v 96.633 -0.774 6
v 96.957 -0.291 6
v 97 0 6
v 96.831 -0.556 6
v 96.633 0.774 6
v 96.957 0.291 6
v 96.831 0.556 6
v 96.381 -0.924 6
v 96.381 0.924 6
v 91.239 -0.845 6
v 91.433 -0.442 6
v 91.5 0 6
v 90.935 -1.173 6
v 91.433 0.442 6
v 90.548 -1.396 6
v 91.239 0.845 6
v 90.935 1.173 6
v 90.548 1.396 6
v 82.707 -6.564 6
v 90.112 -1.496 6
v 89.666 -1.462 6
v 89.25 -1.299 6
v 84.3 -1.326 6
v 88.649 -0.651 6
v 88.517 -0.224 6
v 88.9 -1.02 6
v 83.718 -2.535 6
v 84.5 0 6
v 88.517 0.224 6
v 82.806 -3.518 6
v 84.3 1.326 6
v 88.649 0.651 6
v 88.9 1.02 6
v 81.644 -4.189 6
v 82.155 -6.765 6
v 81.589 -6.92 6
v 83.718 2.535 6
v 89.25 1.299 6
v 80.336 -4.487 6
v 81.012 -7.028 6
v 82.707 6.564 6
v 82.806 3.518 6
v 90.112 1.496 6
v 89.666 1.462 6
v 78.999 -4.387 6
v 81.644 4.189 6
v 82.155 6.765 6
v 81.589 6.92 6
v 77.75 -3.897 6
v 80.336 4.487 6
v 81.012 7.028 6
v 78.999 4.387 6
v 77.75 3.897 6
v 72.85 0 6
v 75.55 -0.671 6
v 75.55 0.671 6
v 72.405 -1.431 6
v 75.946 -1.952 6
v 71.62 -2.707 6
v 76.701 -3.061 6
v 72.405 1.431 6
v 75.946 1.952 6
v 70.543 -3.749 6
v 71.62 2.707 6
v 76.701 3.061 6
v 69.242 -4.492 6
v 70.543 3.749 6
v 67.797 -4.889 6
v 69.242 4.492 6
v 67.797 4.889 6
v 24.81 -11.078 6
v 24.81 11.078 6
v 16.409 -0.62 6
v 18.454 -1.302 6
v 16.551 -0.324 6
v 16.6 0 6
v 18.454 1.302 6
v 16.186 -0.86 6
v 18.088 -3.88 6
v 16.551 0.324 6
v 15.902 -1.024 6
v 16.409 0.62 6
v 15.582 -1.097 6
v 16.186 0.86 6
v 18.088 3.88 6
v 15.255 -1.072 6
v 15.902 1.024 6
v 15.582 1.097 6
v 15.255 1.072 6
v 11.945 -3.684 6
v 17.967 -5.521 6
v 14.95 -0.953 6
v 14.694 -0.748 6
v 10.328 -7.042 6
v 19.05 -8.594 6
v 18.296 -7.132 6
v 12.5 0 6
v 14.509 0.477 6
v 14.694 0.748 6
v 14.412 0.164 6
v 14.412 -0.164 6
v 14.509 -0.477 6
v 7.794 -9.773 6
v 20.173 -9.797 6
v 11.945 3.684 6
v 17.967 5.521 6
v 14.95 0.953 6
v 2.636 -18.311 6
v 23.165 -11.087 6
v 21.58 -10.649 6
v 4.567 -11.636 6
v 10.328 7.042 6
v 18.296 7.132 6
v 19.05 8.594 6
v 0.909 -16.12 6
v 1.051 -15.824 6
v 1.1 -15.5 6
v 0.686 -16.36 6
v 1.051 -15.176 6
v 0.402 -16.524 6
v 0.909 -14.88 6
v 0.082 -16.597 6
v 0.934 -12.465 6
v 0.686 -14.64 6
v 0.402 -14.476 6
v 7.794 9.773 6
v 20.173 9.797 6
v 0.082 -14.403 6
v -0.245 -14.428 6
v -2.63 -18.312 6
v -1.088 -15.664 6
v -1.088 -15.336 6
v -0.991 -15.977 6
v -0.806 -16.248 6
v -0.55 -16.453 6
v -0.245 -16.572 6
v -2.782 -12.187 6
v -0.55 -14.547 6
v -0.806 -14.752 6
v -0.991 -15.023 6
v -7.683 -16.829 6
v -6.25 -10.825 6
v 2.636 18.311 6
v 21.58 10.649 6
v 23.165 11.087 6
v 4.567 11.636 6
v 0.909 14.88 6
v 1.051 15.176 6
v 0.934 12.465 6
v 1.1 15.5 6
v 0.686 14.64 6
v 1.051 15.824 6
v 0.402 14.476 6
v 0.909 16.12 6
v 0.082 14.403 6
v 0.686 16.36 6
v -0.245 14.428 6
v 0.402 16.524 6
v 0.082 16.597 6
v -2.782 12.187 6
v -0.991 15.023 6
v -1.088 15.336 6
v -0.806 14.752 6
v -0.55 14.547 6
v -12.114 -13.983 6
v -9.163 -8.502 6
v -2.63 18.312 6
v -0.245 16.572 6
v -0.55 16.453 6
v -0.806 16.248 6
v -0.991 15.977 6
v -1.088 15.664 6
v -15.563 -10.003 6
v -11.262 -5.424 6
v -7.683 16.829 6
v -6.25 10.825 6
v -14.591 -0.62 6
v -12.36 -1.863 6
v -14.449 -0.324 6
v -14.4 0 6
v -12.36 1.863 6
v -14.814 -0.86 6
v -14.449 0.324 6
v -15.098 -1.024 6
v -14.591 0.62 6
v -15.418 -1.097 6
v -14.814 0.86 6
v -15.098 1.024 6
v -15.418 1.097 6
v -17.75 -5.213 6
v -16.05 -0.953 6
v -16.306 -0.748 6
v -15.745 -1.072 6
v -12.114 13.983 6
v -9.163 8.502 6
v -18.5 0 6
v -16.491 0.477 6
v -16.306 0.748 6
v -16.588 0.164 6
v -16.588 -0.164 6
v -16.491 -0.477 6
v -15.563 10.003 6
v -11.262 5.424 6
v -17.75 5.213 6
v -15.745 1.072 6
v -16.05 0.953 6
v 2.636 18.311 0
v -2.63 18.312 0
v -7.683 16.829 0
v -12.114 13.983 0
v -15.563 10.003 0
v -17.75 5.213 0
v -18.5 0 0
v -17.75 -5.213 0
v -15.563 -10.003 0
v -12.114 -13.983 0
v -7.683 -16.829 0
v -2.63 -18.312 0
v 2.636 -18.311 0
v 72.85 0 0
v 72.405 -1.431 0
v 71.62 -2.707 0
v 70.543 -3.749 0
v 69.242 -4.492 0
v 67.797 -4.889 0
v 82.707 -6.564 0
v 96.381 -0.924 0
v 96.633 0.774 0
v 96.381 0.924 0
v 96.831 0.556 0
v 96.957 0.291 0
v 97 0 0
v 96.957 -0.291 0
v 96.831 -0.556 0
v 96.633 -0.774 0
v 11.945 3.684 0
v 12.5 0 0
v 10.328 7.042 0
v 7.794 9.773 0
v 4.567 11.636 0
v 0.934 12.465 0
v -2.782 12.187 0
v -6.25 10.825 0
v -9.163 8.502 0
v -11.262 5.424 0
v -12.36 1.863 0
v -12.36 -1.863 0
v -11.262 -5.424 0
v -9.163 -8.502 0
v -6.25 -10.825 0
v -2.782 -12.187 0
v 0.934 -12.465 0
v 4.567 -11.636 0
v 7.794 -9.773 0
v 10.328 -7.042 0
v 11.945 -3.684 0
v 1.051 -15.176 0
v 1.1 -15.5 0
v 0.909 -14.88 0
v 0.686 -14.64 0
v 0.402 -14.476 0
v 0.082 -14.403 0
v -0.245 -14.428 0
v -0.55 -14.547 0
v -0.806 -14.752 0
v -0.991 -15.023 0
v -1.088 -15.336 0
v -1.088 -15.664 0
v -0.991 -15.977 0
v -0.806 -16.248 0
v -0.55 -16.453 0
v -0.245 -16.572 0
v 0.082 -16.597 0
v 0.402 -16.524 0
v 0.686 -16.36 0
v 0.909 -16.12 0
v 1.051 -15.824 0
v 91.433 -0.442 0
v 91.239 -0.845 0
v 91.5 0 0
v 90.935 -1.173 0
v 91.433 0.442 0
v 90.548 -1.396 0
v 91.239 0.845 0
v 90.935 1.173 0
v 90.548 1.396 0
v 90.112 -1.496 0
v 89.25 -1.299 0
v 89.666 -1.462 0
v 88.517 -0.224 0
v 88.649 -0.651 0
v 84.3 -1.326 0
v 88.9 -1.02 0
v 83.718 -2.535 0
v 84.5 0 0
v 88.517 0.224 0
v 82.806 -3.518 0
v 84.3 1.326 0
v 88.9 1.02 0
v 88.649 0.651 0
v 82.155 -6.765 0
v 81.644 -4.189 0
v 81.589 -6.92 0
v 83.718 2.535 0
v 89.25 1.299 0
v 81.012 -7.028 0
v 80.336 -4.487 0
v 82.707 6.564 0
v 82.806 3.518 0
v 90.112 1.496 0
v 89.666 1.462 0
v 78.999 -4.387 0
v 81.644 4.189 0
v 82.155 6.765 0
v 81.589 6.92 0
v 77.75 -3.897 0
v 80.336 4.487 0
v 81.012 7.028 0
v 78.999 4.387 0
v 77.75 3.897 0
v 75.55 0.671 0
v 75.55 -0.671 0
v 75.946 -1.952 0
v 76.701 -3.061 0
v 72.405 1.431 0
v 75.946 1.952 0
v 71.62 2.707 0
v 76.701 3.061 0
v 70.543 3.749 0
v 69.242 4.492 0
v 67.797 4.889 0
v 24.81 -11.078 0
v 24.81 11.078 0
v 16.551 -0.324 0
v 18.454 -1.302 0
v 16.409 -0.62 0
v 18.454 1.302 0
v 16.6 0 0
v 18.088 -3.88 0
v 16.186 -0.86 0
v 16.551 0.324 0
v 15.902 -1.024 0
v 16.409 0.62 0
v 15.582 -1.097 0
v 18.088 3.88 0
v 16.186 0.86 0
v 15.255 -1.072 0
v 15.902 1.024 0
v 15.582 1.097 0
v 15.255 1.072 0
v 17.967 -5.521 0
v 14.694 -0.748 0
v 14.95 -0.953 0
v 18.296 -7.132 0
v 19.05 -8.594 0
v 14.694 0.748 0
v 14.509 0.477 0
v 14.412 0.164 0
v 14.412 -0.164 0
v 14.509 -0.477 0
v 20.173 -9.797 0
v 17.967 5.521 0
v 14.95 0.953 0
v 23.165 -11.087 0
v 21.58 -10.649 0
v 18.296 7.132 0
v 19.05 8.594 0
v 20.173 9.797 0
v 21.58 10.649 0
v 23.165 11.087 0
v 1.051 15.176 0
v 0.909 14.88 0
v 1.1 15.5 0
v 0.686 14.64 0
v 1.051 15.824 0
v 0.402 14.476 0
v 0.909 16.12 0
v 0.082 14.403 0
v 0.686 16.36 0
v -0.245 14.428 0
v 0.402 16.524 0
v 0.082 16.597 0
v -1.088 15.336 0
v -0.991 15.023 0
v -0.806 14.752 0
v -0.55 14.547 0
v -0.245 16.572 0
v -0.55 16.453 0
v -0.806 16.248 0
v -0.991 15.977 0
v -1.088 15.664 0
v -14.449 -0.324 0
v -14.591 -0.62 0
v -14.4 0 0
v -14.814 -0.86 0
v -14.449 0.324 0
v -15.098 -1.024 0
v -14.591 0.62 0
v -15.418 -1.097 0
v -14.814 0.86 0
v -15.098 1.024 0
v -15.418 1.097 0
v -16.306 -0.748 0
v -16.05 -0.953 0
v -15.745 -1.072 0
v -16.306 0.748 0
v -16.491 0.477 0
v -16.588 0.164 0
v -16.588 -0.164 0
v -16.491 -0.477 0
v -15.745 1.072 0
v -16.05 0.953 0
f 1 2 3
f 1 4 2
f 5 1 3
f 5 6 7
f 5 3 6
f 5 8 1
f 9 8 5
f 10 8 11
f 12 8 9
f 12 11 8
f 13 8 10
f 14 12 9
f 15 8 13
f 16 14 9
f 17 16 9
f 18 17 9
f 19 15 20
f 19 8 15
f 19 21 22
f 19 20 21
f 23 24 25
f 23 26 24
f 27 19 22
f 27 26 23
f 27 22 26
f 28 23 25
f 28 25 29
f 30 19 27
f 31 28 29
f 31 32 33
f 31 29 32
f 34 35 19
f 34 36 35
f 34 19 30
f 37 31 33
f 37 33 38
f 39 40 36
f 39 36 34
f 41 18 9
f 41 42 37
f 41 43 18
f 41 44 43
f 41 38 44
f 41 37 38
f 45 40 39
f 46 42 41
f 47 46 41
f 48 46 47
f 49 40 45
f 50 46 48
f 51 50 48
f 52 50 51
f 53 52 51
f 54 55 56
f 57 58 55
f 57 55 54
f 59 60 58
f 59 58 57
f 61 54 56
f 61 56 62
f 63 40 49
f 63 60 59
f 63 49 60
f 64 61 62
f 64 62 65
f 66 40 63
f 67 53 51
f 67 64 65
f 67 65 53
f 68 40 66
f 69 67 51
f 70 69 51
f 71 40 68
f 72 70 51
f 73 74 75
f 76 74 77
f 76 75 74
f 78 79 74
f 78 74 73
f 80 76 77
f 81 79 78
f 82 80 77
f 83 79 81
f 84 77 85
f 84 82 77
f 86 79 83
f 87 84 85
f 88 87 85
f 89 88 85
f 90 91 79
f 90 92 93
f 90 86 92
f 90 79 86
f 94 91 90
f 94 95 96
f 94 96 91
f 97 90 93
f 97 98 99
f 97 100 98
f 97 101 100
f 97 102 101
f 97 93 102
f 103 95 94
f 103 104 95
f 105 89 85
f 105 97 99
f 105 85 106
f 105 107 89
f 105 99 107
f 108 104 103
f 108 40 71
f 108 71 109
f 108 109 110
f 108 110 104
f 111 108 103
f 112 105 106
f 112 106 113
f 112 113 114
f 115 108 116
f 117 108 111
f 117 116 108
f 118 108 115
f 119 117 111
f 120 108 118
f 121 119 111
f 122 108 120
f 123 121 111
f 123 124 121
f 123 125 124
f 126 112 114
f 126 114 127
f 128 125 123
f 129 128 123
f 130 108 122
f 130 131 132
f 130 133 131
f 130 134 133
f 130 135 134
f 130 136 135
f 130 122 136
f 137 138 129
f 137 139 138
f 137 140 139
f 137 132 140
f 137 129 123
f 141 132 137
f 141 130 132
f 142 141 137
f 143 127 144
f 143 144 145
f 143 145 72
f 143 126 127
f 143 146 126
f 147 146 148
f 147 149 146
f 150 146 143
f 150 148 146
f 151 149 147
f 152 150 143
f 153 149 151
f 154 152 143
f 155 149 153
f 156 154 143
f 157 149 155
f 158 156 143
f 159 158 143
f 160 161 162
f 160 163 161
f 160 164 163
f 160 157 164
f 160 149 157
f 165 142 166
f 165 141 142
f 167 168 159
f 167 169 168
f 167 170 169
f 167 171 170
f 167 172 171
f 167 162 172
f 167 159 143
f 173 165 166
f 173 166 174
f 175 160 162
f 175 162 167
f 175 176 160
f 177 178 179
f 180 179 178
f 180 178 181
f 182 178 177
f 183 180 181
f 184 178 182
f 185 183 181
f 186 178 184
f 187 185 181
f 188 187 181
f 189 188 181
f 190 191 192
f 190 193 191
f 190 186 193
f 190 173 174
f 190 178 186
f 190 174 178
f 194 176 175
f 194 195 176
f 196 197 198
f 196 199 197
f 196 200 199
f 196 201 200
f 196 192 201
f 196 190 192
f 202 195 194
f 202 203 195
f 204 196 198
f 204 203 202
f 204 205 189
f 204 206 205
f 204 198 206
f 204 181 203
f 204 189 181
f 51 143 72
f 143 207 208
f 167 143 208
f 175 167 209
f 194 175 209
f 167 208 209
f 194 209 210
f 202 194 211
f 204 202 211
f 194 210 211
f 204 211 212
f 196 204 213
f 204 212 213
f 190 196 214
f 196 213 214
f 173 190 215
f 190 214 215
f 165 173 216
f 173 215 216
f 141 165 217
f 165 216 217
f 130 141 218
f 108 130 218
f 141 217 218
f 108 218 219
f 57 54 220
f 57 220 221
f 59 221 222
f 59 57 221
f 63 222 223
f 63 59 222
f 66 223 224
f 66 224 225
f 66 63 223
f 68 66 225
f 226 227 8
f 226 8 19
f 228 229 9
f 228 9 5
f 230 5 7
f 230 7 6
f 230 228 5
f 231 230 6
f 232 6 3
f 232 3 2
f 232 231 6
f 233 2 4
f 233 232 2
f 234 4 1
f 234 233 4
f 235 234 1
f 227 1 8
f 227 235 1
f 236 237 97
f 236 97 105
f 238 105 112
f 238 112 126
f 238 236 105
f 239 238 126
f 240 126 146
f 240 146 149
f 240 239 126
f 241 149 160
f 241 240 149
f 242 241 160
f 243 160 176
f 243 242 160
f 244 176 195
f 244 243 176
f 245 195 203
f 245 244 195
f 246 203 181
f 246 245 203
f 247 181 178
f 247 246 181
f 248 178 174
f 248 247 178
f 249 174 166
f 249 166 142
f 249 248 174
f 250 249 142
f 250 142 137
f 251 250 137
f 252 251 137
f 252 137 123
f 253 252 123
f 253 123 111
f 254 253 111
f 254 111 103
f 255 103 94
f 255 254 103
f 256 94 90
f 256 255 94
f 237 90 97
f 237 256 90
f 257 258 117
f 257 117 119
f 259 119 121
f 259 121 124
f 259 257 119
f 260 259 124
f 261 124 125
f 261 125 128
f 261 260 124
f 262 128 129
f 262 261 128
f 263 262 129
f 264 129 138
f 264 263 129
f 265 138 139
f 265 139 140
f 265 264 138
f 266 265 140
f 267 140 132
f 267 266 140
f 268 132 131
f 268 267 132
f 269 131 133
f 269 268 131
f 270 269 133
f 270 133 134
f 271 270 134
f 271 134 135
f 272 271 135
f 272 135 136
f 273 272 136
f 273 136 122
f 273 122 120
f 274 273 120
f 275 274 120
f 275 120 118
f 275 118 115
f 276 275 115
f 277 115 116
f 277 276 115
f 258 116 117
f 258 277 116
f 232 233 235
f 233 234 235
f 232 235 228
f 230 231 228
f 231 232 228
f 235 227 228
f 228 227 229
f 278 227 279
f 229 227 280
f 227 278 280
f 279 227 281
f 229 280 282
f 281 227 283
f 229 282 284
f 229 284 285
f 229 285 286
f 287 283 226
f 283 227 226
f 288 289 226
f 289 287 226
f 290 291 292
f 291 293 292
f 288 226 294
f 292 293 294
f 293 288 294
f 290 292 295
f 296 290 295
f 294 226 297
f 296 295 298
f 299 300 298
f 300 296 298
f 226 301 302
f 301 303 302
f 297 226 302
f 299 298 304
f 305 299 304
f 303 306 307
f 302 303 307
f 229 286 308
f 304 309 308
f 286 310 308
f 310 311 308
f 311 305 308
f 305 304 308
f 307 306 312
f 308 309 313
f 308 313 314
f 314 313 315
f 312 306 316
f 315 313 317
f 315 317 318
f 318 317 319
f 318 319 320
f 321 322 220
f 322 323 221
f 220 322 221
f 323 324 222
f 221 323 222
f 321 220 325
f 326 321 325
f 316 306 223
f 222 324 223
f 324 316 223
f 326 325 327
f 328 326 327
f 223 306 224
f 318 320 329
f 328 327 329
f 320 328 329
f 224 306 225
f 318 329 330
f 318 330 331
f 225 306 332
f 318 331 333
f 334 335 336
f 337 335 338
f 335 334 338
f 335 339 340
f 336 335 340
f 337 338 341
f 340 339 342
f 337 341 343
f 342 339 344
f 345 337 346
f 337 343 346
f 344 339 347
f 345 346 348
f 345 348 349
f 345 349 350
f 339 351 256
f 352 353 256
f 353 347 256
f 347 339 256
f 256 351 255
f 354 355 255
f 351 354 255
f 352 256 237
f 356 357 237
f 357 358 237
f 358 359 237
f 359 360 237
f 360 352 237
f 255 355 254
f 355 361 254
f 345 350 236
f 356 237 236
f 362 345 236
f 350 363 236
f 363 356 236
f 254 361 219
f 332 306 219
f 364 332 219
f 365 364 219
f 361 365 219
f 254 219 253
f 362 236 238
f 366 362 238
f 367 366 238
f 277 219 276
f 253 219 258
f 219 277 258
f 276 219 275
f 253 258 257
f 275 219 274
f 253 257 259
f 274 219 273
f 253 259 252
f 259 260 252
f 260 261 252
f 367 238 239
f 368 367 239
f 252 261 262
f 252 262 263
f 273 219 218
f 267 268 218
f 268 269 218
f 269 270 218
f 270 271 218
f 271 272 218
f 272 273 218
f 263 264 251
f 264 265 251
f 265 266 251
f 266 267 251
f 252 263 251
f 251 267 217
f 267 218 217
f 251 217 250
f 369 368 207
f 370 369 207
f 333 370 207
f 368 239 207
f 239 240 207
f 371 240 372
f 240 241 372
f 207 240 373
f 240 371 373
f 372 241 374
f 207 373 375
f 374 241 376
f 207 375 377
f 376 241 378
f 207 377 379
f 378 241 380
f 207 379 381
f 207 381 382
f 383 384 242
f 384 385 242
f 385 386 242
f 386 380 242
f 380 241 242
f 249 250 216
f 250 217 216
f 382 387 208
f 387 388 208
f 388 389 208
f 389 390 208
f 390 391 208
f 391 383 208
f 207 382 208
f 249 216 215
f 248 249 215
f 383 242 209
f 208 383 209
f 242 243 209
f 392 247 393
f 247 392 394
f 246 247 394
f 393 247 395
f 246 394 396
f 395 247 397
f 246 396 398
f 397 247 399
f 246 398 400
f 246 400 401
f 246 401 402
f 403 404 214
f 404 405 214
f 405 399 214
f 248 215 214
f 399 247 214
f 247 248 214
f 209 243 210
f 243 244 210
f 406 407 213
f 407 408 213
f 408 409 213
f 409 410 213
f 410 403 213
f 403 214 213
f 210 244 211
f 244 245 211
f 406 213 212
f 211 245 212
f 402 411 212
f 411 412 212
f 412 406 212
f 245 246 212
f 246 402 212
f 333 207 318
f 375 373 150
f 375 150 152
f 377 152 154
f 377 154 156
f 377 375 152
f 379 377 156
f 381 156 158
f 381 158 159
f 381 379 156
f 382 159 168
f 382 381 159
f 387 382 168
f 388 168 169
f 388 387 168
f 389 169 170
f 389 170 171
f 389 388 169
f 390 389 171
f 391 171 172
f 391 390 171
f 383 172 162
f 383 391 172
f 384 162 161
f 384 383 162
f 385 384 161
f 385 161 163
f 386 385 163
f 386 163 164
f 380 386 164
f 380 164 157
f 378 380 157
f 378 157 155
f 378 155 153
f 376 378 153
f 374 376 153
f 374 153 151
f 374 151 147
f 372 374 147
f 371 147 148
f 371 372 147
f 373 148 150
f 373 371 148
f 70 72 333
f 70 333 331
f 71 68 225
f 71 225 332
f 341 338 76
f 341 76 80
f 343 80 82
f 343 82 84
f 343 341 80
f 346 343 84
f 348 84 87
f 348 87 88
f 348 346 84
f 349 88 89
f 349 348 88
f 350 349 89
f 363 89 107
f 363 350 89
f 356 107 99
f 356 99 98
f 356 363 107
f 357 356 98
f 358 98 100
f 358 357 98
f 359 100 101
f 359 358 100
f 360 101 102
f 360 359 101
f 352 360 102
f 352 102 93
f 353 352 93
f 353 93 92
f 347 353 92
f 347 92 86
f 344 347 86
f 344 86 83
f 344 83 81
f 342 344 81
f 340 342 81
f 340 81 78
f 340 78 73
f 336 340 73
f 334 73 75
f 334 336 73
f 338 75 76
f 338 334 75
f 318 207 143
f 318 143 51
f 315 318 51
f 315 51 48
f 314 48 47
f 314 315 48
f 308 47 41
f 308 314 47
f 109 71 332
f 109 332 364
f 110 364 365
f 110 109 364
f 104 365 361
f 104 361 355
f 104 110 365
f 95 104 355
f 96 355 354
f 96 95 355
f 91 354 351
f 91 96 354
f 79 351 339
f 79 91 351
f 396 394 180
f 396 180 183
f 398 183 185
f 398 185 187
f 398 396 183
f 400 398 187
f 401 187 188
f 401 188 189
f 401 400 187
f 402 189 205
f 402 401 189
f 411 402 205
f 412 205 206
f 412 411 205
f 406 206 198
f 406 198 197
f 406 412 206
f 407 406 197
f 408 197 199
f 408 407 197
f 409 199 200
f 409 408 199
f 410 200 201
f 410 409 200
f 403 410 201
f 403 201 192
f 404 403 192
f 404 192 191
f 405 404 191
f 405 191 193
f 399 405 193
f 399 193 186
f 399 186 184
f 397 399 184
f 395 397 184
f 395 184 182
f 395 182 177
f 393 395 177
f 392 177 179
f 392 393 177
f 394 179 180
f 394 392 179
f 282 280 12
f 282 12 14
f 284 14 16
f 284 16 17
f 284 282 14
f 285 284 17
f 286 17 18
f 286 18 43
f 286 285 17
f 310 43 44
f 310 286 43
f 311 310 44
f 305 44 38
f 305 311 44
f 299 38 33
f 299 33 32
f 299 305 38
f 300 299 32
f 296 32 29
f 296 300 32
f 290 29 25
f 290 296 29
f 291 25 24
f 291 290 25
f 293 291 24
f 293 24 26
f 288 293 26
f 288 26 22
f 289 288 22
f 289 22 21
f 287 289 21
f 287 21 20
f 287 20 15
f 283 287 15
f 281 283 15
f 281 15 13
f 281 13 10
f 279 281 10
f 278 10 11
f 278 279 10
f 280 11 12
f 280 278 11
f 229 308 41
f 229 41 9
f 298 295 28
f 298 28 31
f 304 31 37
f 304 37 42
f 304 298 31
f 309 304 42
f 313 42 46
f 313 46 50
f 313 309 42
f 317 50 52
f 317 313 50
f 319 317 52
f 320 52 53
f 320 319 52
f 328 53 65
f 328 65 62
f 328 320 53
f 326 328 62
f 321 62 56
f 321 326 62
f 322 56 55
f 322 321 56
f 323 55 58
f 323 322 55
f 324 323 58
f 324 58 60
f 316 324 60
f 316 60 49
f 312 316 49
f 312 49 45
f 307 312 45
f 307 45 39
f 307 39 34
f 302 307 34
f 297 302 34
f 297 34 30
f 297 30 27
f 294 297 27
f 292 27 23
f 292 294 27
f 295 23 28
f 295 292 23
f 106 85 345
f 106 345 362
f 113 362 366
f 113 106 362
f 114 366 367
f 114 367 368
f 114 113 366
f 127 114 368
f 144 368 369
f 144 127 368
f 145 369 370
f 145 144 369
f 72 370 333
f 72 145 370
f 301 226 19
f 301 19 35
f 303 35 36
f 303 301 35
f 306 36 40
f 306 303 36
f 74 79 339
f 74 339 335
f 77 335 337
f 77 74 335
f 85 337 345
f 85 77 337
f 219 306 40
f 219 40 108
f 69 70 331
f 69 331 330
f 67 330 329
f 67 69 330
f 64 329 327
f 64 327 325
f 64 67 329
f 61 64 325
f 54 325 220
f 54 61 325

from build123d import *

# Parameters (mm, degrees)
ESQUISSE1_R             = 18.5
ESQUISSE1_R_2           = 1.1
ESQUISSE1_R_3           = 12.5
BOSS_EXTRU_1_DEPTH      = 6
BOSS_EXTRU_2_START      = -6
ESQUISSE2_R             = 4.5
BOSS_EXTRU_2_DEPTH      = 6
ENL_V_MAT_EXTRU_1_DEPTH = 90.244943834
CONG_1_R                = 6
BOSS_EXTRU_3_START      = -6
ESQUISSE4_R             = 1.5
BOSS_EXTRU_3_DEPTH      = 6


with BuildPart() as part:
    # Esquisse1 → Boss.-Extru.1 (new body)
    with BuildSketch(Plane.XY):
        Circle(ESQUISSE1_R)
        with Locations((0, 15.5)):
            Circle(ESQUISSE1_R_2, mode=Mode.SUBTRACT)
        with Locations((15.5, 0)):
            Circle(ESQUISSE1_R_2, mode=Mode.SUBTRACT)
        with Locations((0, -15.5)):
            Circle(ESQUISSE1_R_2, mode=Mode.SUBTRACT)
        with Locations((-15.5, 0)):
            Circle(ESQUISSE1_R_2, mode=Mode.SUBTRACT)
        Circle(ESQUISSE1_R_3, mode=Mode.SUBTRACT)
    extrude(amount=BOSS_EXTRU_1_DEPTH)

    # Esquisse2 → Boss.-Extru.2 (add)
    with BuildSketch(Plane.XY.offset(6).offset(BOSS_EXTRU_2_START)):
        with BuildLine():
            Line((2.63625, 18.311203836), (81.01175, 7.027543094))
            ThreePointArc((81.01175, 7.027543094), (87.1, 0), (81.01175, -7.027543094))
            Line((81.01175, -7.027543094), (2.63625, -18.311203836))
            ThreePointArc((2.63625, -18.311203836), (18.5, 0), (2.63625, 18.311203836))
        make_face()
        with Locations((80, 0)):
            Circle(ESQUISSE2_R, mode=Mode.SUBTRACT)
    extrude(amount=BOSS_EXTRU_2_DEPTH)

    # Esquisse3 → Enlèv. mat.-Extru.1 (cut, through all)
    with BuildSketch(Plane.XY.offset(6)):
        with BuildLine():
            Line((13.438126494, 12.714824274), (74.119447809, 3.978580893))
            ThreePointArc((74.119447809, 3.978580893), (72.9, 0), (74.119447809, -3.978580893))
            Line((74.119447809, -3.978580893), (13.438126494, -12.714824274))
            ThreePointArc((13.438126494, -12.714824274), (18.5, 0), (13.438126494, 12.714824274))
        make_face()
    extrude(amount=-ENL_V_MAT_EXTRU_1_DEPTH, mode=Mode.SUBTRACT)

    # Congé1
    # the kernel refuses this fillet: 6 mm, written as the material it adds along each edge
    with BuildSketch(Plane(origin=(74.119447809, -3.978580893, 6), x_dir=(-0.989794801966549, -0.1424999999999999, 0), z_dir=(0, 0, -1))) as cong_1_piece_1:
        with BuildLine():
            CenterArc((6.387487769, 6), CONG_1_R, 192.789750134, 77.210249866)
            ThreePointArc((0.536353935, 4.671755725), (0.666177836, 2.290184264), (0, 0))
            Line((0, 0), (6.387487769, 0))
        make_face()
    extrude(amount=6)
    with BuildSketch(Plane(origin=(74.119447809, 3.978580893, 6), x_dir=(-0.25446461339287313, -0.9670820857253097, 0), z_dir=(0, 0, -1))) as cong_1_piece_2:
        with BuildLine():
            CenterArc((6.689391795, 5.661451882), CONG_1_R, 173.450673101, 77.210249866)
            Line((0.728547621, 6.345803209), (0, 0))
            ThreePointArc((0, 0), (2.351221868, 0.400615273), (4.702443737, 0))
        make_face()
    extrude(amount=6)
    with BuildSketch(Plane(origin=(13.438126494, -12.714824274, 6), x_dir=(0.46579561947351233, 0.8848923329305587, 0), z_dir=(0, 0, -1))) as cong_1_piece_3:
        with BuildLine():
            CenterArc((11.602632031, 5.777450125), CONG_1_R, 144.04573826, 110.300190842)
            Line((6.745716297, 9.300285568), (0, 0))
            ThreePointArc((0, 0), (4.99183006, 0.686195447), (9.98366012, 0))
        make_face()
    extrude(amount=6)
    with BuildSketch(Plane(origin=(13.438126494, 12.714824274, 6), x_dir=(0.4657956194735124, -0.8848923329305588, 0), z_dir=(0, 0, -1))) as cong_1_piece_4:
        with BuildLine():
            CenterArc((11.602632031, -5.777450125), CONG_1_R, 105.654070898, 110.300190842)
            Line((6.745716297, -9.300285568), (0, 0))
            ThreePointArc((0, 0), (4.99183006, -0.686195447), (9.98366012, 0))
        make_face()
    extrude(amount=6)

    # Esquisse4 → Boss.-Extru.3 (add)
    with BuildSketch(Plane.XY.offset(6).offset(BOSS_EXTRU_3_START)):
        with BuildLine():
            Line((82.706875, 6.563751041), (96.38125, 0.924471978))
            ThreePointArc((96.38125, 0.924471978), (97, 0), (96.38125, -0.924471978))
            Line((96.38125, -0.924471978), (82.706875, -6.563751041))
            ThreePointArc((82.706875, -6.563751041), (87.1, 0), (82.706875, 6.563751041))
        make_face()
        with Locations((90, 0)):
            Circle(ESQUISSE4_R, mode=Mode.SUBTRACT)
    extrude(amount=BOSS_EXTRU_3_DEPTH)


solid = part.part
